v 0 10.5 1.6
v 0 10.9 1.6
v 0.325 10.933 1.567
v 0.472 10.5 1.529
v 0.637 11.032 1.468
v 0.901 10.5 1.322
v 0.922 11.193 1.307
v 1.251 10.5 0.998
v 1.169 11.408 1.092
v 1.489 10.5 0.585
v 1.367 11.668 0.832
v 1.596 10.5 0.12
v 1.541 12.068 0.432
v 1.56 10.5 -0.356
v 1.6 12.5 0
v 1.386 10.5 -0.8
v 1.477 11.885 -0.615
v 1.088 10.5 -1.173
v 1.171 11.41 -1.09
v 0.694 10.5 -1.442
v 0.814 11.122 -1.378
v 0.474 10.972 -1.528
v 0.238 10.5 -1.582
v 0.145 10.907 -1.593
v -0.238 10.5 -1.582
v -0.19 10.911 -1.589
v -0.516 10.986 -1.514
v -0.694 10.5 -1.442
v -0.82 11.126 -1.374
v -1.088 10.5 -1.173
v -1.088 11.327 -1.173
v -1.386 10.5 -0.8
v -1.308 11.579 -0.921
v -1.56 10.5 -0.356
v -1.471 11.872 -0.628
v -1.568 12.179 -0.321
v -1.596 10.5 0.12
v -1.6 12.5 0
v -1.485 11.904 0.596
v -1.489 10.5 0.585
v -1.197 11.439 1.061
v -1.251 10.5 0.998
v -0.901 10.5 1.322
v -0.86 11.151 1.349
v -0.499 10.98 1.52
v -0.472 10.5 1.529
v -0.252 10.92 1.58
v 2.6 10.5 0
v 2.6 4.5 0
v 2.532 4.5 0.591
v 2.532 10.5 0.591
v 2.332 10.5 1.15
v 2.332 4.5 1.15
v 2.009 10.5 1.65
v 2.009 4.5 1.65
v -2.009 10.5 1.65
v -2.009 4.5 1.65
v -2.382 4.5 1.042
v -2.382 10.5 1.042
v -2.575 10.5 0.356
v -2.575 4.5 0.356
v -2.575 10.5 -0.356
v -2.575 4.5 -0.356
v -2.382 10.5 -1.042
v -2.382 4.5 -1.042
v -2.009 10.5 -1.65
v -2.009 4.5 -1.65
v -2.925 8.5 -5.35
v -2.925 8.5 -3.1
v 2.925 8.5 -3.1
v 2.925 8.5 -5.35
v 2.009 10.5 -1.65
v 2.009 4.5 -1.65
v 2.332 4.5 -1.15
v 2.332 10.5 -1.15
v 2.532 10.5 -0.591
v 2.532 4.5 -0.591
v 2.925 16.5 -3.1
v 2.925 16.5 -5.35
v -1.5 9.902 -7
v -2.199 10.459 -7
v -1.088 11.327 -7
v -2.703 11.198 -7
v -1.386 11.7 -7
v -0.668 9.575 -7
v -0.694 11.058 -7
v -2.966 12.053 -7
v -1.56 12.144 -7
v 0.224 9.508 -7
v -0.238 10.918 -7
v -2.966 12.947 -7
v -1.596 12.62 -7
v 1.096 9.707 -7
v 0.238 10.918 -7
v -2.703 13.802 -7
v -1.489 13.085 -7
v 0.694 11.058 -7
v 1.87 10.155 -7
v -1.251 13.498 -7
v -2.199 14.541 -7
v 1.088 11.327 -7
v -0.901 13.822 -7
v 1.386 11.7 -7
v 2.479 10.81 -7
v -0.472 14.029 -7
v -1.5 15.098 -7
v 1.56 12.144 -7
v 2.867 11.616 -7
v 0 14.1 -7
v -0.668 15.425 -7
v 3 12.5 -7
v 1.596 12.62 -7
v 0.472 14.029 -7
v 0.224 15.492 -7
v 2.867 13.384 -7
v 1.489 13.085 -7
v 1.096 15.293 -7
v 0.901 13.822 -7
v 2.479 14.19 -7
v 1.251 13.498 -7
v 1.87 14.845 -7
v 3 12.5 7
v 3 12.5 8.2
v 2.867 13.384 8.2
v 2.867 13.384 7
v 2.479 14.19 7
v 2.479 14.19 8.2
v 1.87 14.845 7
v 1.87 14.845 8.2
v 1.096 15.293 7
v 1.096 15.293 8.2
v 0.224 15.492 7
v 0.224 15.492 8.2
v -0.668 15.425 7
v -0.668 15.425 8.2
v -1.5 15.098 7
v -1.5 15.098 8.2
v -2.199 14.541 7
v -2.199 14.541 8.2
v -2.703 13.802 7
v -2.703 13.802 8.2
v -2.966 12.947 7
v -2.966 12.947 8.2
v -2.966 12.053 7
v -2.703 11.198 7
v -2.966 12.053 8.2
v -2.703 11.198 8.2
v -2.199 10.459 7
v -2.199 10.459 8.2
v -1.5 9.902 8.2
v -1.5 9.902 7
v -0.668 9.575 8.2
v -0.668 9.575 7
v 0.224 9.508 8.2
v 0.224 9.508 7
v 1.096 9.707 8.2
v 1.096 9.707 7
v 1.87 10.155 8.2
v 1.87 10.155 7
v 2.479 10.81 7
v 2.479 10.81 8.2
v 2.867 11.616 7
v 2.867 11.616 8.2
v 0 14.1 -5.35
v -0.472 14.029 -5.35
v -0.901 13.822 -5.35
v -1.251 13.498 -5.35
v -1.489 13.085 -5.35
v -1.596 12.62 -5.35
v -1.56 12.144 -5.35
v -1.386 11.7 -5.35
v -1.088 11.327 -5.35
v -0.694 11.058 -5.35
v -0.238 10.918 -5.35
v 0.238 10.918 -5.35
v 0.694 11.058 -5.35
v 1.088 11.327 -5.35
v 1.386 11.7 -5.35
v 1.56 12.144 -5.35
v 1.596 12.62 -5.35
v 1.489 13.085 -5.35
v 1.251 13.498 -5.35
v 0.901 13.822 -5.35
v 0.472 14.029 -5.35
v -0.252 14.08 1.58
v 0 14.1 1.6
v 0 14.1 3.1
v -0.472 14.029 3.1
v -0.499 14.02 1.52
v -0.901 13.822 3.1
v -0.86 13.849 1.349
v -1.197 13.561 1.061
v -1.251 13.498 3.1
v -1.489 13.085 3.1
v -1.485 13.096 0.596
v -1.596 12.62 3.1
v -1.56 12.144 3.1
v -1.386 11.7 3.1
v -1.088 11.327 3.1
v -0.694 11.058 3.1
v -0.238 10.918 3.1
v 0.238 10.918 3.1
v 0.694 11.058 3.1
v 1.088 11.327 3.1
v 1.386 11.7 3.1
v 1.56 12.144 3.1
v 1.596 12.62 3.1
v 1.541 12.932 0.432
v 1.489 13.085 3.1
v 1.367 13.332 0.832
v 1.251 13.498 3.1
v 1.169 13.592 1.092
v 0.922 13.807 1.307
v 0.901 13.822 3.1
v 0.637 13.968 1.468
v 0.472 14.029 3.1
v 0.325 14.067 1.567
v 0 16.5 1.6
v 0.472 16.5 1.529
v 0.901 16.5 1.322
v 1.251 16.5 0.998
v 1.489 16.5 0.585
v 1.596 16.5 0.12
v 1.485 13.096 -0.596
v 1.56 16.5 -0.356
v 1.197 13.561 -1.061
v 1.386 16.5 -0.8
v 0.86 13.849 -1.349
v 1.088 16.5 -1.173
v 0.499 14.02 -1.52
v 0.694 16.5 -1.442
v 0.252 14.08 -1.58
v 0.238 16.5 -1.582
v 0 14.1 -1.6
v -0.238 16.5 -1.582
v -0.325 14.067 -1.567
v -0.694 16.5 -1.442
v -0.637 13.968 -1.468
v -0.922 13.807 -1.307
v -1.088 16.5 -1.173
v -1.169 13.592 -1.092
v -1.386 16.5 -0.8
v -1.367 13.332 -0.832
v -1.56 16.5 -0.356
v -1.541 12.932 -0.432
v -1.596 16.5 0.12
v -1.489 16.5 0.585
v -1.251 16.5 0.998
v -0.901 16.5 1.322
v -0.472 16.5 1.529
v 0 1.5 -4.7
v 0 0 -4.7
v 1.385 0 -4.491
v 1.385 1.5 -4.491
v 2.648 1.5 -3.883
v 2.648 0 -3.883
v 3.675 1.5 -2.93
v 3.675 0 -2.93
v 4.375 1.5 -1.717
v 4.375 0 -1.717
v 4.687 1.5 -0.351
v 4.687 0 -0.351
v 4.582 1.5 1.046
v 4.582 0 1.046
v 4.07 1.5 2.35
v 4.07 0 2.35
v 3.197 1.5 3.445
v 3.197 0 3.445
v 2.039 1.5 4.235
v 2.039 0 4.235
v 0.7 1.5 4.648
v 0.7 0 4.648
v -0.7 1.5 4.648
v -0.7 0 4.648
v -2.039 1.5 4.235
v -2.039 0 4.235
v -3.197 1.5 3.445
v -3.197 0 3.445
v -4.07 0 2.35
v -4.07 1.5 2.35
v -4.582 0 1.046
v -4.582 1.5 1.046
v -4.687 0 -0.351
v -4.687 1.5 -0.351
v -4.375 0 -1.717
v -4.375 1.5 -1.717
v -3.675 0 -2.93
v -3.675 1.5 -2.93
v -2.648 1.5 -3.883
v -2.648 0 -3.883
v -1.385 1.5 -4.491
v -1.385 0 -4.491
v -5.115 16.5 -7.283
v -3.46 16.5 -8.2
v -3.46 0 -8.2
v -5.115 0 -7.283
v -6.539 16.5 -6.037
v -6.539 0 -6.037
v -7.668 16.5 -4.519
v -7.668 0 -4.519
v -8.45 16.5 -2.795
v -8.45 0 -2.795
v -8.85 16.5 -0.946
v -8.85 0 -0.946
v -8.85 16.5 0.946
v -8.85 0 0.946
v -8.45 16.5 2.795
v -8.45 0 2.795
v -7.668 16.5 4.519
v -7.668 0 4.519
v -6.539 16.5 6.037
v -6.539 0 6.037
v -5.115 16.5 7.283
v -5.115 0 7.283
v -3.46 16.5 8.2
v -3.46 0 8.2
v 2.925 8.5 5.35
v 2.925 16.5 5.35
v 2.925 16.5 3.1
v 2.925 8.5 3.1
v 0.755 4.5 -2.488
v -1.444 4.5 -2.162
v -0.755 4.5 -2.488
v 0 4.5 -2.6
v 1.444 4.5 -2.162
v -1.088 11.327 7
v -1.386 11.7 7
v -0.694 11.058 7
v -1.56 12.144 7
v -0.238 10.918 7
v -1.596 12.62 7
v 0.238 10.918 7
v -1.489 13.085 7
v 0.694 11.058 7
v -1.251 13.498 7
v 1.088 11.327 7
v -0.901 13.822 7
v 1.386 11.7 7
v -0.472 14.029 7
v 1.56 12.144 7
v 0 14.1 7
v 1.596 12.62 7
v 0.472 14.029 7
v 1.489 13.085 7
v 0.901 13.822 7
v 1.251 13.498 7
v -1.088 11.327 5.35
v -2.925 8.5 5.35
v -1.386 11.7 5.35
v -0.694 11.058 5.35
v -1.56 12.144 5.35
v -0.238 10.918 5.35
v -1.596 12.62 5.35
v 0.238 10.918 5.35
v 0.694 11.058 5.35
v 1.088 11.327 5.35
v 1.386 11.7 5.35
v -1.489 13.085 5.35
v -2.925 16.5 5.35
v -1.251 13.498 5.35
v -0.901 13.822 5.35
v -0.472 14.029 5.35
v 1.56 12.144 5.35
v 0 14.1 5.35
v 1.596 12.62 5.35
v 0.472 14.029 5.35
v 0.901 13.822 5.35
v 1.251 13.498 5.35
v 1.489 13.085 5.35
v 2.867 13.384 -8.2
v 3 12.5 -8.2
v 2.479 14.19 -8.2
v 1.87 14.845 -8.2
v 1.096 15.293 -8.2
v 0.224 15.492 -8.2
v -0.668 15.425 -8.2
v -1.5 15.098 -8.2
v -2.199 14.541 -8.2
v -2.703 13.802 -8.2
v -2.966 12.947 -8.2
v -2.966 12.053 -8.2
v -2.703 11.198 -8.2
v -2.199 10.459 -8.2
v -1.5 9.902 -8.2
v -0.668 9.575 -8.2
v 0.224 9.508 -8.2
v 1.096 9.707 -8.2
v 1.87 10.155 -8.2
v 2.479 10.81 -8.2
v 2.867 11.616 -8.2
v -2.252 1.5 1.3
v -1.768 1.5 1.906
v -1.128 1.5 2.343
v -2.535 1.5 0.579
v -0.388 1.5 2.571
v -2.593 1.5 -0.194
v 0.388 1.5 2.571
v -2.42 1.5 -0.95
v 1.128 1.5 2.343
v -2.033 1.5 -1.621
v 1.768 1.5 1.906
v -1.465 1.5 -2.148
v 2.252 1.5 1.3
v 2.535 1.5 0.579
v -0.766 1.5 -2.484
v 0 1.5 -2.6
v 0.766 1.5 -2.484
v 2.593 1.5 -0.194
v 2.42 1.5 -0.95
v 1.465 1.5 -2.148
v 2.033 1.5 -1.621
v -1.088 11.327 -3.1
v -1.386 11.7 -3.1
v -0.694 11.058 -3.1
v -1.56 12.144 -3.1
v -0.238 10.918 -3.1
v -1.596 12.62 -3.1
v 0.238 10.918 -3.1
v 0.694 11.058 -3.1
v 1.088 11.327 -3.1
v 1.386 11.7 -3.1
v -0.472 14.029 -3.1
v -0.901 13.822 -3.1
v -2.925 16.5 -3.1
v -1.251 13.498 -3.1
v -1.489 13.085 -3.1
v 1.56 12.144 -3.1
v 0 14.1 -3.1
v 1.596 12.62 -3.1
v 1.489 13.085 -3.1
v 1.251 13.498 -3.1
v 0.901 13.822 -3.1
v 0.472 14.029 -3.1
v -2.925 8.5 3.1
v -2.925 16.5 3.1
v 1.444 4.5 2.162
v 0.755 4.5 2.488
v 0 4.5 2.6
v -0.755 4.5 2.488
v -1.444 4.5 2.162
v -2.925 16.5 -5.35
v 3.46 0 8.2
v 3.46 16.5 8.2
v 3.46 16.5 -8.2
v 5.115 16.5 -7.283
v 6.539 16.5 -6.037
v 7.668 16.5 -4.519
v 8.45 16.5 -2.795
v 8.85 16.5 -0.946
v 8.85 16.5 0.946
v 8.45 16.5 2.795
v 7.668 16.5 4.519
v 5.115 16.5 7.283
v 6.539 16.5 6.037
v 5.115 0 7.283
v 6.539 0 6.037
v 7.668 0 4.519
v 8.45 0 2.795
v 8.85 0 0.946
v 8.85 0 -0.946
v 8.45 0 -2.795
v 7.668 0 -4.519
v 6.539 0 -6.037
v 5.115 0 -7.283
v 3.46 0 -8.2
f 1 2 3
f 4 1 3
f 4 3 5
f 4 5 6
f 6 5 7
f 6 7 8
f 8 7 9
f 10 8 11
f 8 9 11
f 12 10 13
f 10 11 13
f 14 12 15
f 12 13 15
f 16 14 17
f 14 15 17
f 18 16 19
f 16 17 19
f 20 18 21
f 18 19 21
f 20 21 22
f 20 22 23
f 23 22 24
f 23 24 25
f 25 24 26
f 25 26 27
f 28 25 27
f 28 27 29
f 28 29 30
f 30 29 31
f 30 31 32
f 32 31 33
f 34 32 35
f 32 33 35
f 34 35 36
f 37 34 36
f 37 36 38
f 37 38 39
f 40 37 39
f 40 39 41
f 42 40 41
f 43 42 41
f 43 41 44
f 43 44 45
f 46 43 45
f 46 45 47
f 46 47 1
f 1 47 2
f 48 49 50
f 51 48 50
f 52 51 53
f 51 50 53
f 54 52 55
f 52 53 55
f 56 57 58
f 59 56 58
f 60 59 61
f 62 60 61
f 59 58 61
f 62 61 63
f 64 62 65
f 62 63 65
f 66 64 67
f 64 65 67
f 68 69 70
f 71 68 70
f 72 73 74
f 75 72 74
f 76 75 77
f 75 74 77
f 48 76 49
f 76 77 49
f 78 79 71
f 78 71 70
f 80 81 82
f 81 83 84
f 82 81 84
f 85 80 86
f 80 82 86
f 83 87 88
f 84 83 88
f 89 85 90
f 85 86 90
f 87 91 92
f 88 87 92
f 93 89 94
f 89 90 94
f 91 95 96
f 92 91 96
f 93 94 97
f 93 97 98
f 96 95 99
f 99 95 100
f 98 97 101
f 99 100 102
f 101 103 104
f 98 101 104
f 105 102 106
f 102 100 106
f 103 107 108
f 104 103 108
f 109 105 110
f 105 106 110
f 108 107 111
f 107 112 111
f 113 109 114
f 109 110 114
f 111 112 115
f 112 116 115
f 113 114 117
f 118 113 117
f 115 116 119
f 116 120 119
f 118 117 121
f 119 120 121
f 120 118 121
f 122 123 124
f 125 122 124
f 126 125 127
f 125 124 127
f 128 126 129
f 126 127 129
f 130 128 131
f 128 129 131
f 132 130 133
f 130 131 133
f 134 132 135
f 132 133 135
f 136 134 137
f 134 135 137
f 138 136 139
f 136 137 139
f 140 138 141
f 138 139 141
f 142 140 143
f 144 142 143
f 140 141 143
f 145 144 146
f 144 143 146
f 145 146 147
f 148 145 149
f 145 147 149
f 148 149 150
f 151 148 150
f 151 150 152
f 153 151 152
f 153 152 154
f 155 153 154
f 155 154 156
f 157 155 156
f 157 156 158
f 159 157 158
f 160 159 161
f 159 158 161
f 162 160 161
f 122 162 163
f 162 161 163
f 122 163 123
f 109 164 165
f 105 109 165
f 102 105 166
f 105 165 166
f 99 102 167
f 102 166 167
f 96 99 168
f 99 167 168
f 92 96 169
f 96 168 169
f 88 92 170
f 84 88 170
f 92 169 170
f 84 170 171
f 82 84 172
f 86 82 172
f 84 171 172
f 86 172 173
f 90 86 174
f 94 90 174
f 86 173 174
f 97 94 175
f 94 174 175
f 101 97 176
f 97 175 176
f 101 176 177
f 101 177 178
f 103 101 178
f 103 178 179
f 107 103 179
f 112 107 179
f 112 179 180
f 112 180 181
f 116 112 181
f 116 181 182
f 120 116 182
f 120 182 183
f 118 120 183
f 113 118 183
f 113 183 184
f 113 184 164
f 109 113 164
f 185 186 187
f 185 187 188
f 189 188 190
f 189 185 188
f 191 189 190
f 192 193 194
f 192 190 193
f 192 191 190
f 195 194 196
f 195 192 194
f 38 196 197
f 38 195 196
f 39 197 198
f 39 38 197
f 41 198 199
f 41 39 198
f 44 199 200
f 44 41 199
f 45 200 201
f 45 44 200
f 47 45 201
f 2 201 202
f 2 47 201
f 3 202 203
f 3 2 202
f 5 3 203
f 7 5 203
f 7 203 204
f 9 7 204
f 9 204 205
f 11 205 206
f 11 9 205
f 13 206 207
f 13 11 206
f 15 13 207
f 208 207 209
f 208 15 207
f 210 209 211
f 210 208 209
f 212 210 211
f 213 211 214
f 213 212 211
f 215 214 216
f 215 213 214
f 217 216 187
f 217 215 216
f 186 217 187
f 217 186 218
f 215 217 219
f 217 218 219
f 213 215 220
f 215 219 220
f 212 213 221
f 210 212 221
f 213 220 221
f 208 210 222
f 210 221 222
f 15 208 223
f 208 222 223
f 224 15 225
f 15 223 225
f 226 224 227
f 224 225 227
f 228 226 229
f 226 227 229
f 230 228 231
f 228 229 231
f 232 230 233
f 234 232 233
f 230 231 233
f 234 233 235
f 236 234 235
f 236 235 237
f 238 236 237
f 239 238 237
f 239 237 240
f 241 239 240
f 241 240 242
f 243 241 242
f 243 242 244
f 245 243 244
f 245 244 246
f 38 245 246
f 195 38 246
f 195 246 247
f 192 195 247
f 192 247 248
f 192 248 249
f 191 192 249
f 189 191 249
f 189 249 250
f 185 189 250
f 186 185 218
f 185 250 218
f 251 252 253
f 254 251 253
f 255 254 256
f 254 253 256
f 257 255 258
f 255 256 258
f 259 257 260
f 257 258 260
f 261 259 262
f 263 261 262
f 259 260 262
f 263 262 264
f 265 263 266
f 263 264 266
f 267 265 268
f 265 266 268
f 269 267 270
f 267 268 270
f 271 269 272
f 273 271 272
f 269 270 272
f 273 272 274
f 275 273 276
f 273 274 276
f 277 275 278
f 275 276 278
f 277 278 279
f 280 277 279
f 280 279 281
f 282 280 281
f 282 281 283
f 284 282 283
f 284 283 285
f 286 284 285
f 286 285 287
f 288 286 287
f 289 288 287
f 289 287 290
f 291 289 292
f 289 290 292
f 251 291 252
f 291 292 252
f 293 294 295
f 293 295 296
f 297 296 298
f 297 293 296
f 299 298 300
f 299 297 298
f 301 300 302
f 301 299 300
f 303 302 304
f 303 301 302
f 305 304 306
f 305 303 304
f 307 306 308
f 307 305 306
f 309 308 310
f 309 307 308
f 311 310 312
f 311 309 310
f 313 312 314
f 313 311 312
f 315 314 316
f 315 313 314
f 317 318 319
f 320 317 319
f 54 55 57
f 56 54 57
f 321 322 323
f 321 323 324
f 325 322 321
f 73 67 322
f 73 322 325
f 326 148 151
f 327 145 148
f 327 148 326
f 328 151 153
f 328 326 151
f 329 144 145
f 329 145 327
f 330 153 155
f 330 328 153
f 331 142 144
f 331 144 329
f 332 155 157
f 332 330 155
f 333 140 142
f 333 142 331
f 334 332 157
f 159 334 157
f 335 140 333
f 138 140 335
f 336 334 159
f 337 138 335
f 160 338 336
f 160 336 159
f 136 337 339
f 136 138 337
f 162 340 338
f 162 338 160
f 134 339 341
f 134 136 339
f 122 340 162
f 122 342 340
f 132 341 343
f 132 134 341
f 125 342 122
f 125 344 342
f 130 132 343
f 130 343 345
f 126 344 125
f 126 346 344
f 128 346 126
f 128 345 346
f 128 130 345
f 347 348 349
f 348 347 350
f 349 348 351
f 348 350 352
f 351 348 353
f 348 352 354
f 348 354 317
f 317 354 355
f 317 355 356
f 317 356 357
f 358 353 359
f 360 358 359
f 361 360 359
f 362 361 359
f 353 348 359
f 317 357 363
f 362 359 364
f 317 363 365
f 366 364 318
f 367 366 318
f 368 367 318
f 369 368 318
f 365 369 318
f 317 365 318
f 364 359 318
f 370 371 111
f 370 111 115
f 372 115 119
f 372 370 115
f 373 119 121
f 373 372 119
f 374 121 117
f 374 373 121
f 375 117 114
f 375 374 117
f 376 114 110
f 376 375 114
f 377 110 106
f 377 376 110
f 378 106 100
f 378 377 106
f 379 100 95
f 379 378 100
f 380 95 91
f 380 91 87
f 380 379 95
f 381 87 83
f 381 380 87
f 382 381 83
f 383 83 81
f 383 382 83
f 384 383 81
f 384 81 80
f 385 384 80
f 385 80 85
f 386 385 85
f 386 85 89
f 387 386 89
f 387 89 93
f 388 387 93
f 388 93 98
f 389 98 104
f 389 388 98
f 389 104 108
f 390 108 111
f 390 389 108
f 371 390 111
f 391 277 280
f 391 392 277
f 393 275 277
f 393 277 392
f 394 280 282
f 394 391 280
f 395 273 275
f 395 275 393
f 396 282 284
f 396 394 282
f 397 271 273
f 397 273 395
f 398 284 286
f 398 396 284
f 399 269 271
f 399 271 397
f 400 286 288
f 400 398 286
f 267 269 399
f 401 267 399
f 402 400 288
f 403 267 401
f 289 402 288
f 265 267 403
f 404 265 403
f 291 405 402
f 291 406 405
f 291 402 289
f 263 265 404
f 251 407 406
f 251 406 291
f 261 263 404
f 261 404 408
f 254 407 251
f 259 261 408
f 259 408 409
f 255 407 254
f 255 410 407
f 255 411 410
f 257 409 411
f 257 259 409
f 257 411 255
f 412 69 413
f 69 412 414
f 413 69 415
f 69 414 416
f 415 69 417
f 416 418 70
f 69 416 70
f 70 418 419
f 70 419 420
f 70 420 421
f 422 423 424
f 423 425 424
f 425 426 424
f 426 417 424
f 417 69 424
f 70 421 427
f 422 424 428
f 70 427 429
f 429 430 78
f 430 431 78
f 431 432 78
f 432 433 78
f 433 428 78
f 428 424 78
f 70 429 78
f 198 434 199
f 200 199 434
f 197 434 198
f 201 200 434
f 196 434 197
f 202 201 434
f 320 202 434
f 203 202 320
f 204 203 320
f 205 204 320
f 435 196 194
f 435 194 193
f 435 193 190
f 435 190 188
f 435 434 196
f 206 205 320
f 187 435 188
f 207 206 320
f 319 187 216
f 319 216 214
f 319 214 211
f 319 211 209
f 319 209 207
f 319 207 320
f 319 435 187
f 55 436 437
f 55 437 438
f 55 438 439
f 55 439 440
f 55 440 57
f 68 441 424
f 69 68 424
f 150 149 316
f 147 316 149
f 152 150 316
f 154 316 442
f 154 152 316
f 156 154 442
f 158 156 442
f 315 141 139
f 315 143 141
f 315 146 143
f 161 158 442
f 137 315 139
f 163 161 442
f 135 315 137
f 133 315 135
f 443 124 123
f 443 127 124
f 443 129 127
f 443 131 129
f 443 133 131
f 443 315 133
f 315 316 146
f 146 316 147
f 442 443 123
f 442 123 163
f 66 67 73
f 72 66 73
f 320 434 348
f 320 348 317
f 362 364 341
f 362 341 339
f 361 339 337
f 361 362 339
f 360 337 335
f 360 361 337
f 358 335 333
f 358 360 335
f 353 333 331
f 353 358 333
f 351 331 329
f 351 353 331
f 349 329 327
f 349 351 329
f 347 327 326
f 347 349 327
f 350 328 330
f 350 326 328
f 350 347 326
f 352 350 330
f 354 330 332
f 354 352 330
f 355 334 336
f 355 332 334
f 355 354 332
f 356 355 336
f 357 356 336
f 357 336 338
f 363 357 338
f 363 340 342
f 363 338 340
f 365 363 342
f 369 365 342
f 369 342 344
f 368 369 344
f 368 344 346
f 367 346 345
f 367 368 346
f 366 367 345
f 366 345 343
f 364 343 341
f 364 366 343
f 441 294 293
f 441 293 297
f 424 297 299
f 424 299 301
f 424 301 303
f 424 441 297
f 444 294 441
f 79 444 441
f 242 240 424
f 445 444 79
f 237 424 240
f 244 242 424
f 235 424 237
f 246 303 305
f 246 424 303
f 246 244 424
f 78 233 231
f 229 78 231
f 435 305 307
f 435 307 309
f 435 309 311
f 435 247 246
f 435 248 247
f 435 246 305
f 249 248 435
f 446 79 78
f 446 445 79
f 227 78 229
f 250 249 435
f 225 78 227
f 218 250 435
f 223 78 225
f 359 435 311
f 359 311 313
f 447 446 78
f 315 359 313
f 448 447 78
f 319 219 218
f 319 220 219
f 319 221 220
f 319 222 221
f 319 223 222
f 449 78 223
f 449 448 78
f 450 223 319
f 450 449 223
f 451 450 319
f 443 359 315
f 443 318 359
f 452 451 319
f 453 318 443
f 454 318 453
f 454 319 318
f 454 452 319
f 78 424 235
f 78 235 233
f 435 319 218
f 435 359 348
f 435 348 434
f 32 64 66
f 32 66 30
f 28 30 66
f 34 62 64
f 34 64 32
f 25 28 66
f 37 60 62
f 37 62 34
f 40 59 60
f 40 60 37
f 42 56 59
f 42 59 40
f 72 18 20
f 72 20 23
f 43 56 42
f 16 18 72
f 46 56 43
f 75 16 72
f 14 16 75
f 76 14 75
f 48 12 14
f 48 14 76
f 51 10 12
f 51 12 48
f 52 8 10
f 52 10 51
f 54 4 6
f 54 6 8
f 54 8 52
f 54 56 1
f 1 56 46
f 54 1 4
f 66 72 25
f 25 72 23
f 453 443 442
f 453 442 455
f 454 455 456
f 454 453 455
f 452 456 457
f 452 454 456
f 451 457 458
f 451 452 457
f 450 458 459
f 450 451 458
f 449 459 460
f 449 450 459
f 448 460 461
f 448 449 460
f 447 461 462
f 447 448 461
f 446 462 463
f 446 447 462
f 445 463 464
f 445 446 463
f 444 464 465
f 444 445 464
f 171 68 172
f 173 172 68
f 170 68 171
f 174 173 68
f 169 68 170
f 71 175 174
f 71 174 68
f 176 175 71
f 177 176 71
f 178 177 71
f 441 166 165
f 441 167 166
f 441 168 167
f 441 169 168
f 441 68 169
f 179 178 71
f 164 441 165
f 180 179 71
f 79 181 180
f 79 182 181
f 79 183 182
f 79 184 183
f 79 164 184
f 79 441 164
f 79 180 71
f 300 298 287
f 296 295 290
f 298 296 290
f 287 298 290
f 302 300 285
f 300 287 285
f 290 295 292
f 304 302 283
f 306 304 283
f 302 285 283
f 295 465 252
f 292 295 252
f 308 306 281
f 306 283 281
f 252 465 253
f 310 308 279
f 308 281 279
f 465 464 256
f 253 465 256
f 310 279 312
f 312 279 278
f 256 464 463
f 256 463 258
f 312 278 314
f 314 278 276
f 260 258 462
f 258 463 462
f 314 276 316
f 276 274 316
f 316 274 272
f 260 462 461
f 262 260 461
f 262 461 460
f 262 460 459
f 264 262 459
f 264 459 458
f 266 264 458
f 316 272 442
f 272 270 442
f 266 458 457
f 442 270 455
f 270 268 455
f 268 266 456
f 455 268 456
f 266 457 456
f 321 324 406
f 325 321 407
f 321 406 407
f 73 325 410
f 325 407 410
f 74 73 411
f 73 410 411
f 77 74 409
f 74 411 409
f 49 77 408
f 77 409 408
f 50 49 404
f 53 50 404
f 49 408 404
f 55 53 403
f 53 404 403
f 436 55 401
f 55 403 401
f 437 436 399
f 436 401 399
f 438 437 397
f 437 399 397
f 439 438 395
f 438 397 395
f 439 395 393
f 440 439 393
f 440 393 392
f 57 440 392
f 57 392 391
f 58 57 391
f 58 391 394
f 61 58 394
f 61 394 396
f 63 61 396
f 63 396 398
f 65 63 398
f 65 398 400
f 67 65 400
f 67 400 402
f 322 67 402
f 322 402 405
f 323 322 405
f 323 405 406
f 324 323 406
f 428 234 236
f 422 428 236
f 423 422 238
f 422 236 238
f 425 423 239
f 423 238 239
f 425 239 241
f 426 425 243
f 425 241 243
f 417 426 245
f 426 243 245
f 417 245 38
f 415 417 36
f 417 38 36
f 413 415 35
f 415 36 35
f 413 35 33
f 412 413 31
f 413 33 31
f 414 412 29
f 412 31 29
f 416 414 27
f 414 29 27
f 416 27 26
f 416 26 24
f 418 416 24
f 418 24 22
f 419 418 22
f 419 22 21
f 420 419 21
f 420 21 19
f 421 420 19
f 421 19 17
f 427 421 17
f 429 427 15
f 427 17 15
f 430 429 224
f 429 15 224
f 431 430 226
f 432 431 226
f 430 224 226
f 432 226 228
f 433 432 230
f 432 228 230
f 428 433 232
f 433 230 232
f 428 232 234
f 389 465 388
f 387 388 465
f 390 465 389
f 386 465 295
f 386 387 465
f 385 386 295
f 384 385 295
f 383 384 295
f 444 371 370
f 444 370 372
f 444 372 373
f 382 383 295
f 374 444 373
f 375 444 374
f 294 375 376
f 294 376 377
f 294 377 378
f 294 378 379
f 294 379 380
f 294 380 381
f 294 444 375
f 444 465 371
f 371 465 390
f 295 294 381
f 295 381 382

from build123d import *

# Parameters (mm, degrees)
ESQUISSE1_R             = 11.3
BOSS_EXTRU_1_DEPTH      = 16.5
ESQUISSE2_R             = 4.7
ENL_V_MAT_EXTRU_1_DEPTH = 1.5
ESQUISSE3_R             = 2.6
ENL_V_MAT_EXTRU_2_DEPTH = 3
ENL_V_MAT_EXTRU_3_DEPTH = 6
ESQUISSE5_R             = 1.6
ENL_V_MAT_EXTRU_4_DEPTH = 6.5
ESQUISSE6_W             = 5.85
ESQUISSE6_H             = 2.25
ENL_V_MAT_EXTRU_5_DEPTH = 8
ENL_V_START             = -3.1
ESQUISSE7_R             = 1.6
ENL_V_MAT_EXTRU_6_DEPTH = 28.74345755
ESQUISSE8_R             = 11.3
ENL_V_MAT_EXTRU_7_DEPTH = 23.970198254
ESQUISSE9_R             = 3
ENL_V_MAT_EXTRU_8_DEPTH = 1.2


with BuildPart() as part:
    # Esquisse1 → Boss.-Extru.1 (new body)
    with BuildSketch(Plane(origin=(0, 0, 0), x_dir=(1, 0, 0), z_dir=(0, 1, 0))):
        with Locations(Location((0, 0, 0), (0, 0, 270))):
            Circle(ESQUISSE1_R)
    extrude(amount=BOSS_EXTRU_1_DEPTH)

    # Esquisse2 → Enlèv. mat.-Extru.1 (cut)
    with BuildSketch(Plane.XZ):
        with Locations(Location((0, 0, 0), (0, 0, 270))):
            Circle(ESQUISSE2_R)
    extrude(amount=-ENL_V_MAT_EXTRU_1_DEPTH, mode=Mode.SUBTRACT)

    # Esquisse3 → Enlèv. mat.-Extru.2 (cut)
    with BuildSketch(Plane.XZ.offset(-1.5)):
        with Locations(Location((0, 0, 0), (0, 0, 270))):
            Circle(ESQUISSE3_R)
    extrude(amount=-ENL_V_MAT_EXTRU_2_DEPTH, mode=Mode.SUBTRACT)

    # Esquisse4 → Enlèv. mat.-Extru.3 (cut)
    with BuildSketch(Plane.XZ.offset(-4.5)):
        with BuildLine():
            Line((2.00935313, 1.65), (-2.00935313, 1.65))
            ThreePointArc((-2.00935313, 1.65), (-2.6, 0), (-2.00935313, -1.65))
            Line((-2.00935313, -1.65), (2.00935313, -1.65))
            ThreePointArc((2.00935313, -1.65), (2.447888696, -0.876265332), (2.6, 0))
            ThreePointArc((2.6, 0), (2.447888696, 0.876265332), (2.00935313, 1.65))
        make_face()
    extrude(amount=-ENL_V_MAT_EXTRU_3_DEPTH, mode=Mode.SUBTRACT)

    # Esquisse5 → Enlèv. mat.-Extru.4 (cut)
    with BuildSketch(Plane(origin=(0, 16.5, 0), x_dir=(1, 0, 0), z_dir=(0, 1, 0))):
        with Locations(Location((0, 0, 0), (0, 0, 270))):
            Circle(ESQUISSE5_R)
    extrude(amount=-ENL_V_MAT_EXTRU_4_DEPTH, mode=Mode.SUBTRACT)

    # Esquisse6 → Enlèv. mat.-Extru.5 (cut)
    with BuildSketch(Plane(origin=(0, 16.5, 0), x_dir=(1, 0, 0), z_dir=(0, 1, 0))):
        with Locations((0, -4.225)):
            Rectangle(ESQUISSE6_W, ESQUISSE6_H)
    enl_v_mat_extru_5 = extrude(amount=-ENL_V_MAT_EXTRU_5_DEPTH, mode=Mode.SUBTRACT)

    # Esquisse7 → Enlèv. mat.-Extru.6 (cut)
    with BuildSketch(Plane.XY.offset(3.1).offset(ENL_V_START)):
        with Locations(Location((0, 12.5, 0), (0, 0, 90))):
            Circle(ESQUISSE7_R)
    enl_v_mat_extru_6 = extrude(amount=ENL_V_MAT_EXTRU_6_DEPTH, mode=Mode.SUBTRACT)

    # Esquisse8 → Enlèv. mat.-Extru.7 (cut, through all)
    with BuildSketch(Plane(origin=(0, 16.5, 0), x_dir=(1, 0, 0), z_dir=(0, 1, 0))):
        Circle(ESQUISSE8_R)
        with BuildLine():
            Line((-3.459768778, -8.2), (3.459768778, -8.2))
            ThreePointArc((3.459768778, -8.2), (8.9, 0), (3.459768778, 8.2))
            Line((3.459768778, 8.2), (-3.459768778, 8.2))
            ThreePointArc((-3.459768778, 8.2), (-8.9, 0), (-3.459768778, -8.2))
        make_face(mode=Mode.SUBTRACT)
    extrude(amount=-ENL_V_MAT_EXTRU_7_DEPTH, mode=Mode.SUBTRACT)

    # Esquisse9 → Enlèv. mat.-Extru.8 (cut)
    with BuildSketch(Plane.XY.offset(8.2)):
        with Locations((0, 12.5)):
            Circle(ESQUISSE9_R)
    enl_v_mat_extru_8 = extrude(amount=-ENL_V_MAT_EXTRU_8_DEPTH, mode=Mode.SUBTRACT)

    # Symétrie1: Enlèv. mat.-Extru.5, Enlèv. mat.-Extru.6, Enlèv. mat.-Extru.8 across plane
    add(enl_v_mat_extru_5.mirror(Plane.XY), mode=Mode.SUBTRACT)
    add(enl_v_mat_extru_6.mirror(Plane.XY), mode=Mode.SUBTRACT)
    add(enl_v_mat_extru_8.mirror(Plane.XY), mode=Mode.SUBTRACT)


solid = part.part
